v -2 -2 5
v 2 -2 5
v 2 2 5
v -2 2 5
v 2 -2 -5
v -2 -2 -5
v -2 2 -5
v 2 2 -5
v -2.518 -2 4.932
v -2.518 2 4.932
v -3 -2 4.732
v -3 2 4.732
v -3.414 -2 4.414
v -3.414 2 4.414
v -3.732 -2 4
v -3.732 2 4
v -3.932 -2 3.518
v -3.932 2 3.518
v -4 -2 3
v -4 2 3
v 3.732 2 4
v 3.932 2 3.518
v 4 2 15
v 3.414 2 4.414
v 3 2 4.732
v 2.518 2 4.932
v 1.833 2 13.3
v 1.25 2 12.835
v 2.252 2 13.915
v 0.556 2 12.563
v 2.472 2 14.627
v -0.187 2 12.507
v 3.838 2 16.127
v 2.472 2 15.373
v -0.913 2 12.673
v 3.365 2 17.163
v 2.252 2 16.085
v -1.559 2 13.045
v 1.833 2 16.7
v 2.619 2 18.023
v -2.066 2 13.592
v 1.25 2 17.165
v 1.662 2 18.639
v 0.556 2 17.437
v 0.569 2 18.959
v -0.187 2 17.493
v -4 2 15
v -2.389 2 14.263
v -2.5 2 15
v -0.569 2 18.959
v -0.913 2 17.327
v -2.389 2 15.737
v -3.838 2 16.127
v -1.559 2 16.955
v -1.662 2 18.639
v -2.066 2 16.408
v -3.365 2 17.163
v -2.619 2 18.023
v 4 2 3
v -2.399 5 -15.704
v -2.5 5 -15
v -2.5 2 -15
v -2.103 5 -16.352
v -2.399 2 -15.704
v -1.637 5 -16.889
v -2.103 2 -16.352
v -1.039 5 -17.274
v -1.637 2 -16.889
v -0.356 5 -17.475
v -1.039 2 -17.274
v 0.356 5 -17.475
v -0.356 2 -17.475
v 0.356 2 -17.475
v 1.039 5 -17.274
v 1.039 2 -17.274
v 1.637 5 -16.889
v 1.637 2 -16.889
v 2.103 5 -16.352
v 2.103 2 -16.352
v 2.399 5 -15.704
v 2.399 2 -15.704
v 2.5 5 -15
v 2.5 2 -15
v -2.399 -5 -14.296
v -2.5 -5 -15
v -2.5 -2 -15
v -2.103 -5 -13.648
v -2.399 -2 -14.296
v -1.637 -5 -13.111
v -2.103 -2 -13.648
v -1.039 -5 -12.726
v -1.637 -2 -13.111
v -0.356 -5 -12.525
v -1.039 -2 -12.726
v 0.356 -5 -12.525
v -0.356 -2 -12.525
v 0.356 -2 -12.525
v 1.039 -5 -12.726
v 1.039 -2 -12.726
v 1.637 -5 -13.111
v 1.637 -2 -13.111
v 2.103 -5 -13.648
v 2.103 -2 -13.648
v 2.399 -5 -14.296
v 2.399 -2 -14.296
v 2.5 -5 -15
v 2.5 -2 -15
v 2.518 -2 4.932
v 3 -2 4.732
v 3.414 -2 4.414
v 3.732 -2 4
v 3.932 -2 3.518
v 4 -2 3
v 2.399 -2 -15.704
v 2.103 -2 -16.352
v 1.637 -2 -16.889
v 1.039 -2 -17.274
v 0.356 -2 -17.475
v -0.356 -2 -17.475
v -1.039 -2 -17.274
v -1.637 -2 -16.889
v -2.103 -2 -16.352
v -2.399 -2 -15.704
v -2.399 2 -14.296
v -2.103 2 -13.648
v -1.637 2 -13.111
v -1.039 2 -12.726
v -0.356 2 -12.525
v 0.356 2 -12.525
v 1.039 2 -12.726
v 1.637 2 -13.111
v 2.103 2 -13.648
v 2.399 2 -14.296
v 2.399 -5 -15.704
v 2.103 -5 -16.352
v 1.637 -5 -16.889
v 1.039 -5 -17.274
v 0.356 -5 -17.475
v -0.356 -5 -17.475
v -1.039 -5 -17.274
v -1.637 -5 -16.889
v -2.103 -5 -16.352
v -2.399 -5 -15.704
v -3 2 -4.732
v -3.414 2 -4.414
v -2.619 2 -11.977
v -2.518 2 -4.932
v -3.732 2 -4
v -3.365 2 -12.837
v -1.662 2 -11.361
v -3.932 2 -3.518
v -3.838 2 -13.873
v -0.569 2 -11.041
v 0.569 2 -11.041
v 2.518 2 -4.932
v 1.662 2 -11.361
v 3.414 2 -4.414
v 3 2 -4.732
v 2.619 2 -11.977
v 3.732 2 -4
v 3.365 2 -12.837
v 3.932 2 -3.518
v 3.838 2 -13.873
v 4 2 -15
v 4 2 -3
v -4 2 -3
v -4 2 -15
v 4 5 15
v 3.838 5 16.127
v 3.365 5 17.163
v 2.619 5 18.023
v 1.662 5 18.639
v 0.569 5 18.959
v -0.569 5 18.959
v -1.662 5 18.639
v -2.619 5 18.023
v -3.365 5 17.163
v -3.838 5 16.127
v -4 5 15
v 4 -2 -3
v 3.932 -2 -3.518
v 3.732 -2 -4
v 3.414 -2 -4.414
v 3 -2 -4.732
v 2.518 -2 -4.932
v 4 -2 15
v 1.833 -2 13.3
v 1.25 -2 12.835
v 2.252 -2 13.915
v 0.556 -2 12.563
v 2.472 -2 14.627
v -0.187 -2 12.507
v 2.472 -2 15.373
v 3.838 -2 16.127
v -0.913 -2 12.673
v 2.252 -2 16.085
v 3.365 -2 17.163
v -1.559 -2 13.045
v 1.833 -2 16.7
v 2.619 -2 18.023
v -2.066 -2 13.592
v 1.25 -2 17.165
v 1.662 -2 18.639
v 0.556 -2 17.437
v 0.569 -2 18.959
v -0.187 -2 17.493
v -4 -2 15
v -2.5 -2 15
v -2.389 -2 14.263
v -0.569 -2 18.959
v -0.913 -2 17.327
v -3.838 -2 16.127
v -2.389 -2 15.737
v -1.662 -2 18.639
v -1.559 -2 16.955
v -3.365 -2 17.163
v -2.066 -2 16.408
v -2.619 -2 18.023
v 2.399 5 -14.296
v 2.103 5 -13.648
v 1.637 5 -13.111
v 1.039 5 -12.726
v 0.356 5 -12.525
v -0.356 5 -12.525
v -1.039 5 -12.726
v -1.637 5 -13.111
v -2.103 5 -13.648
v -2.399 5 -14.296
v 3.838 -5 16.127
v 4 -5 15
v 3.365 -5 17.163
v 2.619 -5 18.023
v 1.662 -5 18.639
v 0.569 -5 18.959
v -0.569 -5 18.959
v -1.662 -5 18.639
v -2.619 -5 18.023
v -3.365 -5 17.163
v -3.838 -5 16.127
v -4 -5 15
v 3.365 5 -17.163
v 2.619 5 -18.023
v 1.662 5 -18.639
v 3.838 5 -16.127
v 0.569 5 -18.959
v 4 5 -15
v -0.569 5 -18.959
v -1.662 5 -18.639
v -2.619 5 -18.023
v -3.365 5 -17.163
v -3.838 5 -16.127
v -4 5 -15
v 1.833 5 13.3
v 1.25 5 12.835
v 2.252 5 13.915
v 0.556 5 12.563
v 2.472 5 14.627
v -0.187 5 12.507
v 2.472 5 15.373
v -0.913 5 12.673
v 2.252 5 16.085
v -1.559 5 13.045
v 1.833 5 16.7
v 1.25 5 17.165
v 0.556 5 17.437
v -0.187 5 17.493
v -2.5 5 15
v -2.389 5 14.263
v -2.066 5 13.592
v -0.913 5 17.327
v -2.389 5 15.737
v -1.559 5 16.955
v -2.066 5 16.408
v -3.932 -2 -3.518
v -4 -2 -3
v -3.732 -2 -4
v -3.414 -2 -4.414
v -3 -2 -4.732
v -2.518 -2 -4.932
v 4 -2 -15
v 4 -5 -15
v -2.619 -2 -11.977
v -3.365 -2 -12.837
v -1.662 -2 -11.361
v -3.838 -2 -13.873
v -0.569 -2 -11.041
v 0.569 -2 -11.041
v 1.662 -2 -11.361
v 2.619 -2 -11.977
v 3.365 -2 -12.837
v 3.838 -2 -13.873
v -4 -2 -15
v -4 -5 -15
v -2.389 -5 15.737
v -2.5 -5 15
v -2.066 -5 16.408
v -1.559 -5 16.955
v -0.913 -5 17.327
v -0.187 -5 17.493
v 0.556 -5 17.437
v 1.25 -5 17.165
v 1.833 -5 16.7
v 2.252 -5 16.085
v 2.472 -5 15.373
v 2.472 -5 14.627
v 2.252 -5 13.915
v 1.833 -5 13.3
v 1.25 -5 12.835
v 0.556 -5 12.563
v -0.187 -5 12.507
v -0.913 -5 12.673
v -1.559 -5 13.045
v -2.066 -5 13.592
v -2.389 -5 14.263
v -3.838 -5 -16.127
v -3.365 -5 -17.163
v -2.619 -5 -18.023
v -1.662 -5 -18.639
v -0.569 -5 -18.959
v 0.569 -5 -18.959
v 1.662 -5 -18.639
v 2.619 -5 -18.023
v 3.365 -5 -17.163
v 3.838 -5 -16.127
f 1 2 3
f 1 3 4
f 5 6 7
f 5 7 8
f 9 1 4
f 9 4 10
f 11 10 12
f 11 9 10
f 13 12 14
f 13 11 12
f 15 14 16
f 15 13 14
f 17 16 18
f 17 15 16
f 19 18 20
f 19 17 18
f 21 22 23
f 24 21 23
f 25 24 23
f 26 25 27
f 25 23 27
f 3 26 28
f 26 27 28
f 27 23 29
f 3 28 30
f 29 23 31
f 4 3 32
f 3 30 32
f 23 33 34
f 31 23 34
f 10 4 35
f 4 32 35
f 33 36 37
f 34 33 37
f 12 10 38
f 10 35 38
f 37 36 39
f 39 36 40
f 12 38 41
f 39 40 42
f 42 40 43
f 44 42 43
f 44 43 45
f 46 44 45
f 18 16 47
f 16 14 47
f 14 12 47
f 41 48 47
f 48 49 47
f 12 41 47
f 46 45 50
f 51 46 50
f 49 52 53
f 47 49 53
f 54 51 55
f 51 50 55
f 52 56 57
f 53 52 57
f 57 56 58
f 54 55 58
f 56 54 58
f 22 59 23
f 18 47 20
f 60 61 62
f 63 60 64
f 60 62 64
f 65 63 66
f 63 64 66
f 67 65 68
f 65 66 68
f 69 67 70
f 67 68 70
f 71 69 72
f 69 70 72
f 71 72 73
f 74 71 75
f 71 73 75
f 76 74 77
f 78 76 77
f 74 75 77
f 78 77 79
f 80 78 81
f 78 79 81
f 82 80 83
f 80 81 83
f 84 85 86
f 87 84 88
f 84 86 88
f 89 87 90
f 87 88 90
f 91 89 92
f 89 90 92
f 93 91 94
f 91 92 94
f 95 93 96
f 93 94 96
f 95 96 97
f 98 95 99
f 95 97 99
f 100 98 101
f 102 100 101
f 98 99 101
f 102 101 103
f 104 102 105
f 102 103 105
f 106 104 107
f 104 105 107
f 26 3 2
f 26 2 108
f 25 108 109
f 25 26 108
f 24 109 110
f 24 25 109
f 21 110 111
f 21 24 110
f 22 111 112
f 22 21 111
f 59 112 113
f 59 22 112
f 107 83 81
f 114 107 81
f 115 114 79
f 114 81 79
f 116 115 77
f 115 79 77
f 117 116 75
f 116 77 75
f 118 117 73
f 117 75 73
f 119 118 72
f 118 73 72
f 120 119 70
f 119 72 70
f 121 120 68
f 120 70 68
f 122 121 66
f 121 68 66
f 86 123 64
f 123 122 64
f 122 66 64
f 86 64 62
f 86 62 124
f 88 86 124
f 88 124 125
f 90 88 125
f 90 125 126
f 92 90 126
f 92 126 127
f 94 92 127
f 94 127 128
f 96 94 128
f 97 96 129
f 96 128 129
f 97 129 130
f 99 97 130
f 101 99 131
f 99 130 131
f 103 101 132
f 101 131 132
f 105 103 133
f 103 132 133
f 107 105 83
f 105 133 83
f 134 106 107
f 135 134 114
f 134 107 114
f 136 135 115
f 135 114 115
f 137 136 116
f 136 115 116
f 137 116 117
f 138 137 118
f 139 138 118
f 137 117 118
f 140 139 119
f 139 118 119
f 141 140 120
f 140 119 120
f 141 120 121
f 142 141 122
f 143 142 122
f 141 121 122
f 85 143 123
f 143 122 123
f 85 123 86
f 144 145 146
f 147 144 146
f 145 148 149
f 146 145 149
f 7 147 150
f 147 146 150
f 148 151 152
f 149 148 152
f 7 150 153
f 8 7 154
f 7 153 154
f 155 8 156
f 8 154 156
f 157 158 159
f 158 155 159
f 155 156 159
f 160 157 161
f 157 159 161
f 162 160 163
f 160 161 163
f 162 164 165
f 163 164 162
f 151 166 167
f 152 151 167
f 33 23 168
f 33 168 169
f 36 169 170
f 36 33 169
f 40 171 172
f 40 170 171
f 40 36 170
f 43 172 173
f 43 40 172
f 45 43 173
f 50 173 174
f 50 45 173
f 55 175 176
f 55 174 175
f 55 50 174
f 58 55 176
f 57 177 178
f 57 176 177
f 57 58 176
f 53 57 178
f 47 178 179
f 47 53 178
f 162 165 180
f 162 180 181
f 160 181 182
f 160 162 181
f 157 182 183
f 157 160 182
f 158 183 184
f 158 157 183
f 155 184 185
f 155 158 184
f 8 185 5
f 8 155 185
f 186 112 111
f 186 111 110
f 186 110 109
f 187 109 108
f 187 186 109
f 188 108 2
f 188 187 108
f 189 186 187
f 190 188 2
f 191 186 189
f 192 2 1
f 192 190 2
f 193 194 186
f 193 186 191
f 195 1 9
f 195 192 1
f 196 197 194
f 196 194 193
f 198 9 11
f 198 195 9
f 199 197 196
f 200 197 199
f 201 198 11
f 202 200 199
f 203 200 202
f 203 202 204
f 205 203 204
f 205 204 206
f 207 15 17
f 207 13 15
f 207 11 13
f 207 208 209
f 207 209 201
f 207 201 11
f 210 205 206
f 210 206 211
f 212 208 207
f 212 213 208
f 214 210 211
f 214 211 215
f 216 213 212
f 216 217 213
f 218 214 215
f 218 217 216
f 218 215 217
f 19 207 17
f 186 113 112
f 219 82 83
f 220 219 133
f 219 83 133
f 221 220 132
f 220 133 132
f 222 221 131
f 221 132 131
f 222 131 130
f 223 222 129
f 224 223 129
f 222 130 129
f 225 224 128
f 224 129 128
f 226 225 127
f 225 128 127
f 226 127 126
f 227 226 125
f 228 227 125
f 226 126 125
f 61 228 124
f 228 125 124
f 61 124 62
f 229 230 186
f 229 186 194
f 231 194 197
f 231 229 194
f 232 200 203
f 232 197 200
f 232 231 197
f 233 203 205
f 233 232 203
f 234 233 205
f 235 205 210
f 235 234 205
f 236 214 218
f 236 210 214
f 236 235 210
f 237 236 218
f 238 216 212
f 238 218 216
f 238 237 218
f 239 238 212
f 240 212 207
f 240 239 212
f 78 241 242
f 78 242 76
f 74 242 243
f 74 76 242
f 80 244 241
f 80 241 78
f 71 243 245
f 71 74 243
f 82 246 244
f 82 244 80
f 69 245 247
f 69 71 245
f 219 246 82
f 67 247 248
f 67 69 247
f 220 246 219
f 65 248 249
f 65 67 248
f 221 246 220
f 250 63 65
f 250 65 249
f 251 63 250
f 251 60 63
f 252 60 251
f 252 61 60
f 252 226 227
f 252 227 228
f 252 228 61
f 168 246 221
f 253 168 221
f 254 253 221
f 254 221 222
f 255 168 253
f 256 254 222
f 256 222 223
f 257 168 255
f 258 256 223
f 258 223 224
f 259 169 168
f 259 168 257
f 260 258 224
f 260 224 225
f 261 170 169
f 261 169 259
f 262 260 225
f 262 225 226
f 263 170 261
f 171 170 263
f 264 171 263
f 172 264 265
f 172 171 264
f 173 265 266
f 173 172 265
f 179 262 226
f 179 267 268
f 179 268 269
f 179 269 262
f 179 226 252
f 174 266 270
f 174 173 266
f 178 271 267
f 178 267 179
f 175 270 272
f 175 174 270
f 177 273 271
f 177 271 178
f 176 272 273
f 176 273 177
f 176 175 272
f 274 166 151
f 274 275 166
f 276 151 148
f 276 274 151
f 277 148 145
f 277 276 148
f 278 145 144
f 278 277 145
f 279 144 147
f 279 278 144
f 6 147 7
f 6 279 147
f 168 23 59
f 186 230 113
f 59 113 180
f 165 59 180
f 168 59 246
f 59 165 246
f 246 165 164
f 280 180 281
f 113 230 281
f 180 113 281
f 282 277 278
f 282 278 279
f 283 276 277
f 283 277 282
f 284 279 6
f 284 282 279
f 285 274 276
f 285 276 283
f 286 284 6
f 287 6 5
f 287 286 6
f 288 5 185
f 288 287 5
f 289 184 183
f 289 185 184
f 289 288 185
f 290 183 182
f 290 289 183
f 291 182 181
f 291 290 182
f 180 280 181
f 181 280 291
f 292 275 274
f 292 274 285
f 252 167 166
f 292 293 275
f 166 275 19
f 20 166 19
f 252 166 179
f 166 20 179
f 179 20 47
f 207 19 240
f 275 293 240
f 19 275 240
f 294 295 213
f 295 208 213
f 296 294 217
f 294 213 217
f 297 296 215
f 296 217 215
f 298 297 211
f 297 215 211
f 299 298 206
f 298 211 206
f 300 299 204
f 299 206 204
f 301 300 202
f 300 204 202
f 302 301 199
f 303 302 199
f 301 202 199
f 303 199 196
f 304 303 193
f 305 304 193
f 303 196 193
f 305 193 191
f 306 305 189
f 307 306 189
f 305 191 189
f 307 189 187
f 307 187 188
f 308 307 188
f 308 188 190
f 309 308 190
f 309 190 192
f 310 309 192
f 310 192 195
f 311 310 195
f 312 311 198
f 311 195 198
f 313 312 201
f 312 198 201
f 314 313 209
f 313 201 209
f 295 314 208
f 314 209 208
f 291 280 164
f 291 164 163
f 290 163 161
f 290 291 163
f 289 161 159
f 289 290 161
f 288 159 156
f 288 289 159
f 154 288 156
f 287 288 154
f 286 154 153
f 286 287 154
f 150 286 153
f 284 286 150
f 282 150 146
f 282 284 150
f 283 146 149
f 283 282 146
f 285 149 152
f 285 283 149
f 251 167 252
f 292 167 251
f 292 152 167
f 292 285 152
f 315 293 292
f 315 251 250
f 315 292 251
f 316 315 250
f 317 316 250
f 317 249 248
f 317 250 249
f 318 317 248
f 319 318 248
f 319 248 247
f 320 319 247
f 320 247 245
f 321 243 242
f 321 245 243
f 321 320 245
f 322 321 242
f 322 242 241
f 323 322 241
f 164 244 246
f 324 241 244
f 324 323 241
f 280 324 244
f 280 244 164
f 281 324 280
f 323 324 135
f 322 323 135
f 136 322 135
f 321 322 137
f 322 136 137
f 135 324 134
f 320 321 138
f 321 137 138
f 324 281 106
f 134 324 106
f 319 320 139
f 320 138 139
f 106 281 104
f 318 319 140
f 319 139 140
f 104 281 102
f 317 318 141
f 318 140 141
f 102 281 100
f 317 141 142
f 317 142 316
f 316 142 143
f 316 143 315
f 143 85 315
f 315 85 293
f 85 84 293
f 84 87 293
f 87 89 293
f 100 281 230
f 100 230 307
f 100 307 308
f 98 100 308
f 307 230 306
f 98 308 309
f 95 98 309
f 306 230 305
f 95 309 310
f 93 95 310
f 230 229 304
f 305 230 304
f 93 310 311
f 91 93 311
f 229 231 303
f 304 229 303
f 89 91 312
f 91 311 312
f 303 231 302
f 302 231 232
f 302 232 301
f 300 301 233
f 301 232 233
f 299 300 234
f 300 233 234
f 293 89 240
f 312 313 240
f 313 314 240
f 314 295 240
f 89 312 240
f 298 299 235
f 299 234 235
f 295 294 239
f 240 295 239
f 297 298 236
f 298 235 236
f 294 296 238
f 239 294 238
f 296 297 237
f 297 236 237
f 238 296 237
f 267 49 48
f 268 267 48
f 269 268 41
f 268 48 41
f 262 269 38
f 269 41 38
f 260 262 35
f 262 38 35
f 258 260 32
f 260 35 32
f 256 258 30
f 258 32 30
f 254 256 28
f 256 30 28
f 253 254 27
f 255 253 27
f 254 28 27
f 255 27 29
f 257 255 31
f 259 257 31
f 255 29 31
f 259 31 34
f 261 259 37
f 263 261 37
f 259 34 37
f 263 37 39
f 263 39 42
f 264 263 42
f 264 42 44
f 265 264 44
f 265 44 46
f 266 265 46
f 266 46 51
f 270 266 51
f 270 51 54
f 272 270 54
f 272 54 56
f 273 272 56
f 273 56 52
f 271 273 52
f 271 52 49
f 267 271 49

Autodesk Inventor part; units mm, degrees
ref_plane "YZ Plane" through (0, 0, 0) normal (1, 0, 0) x (0, 1, 0)
ref_plane "XZ Plane" through (0, 0, 0) normal (0, 1, 0) x (-1, 0, 0)
ref_plane "XY Plane" through (0, 0, 0) normal (0, 0, 1) x (1, 0, 0)
sketch "Szkic1" plane through (0, 0, 0) normal (0, 1, 0) x (-1, 0, 0)
  line L0 (0, 15) -> (0, -15) construction
  line L1 (-4, 15) -> (-4, -15)
  line L2 (4, -15) -> (4, 15)
  arc A0 (4, 15) -> (-4, 15) centre (0, 15) ccw
  arc A1 (-4, -15) -> (4, -15) centre (0, -15) ccw
  circle A2 centre (0, -15) radius 2.5
  circle A3 centre (0, 15) radius 2.5
  line L3 (0, 15) -> (0, 5)
  line L4 (0, 5) -> (4, 5)
  line L5 (0, 5) -> (-4, 5)
  point P0 (0, 0)
  dimension "d0" = 15
  dimension "d1" = 8
  dimension "d2" = 5
  dimension "d3" = 5
  dimension "d6" = 10
extrude "Wyciągnięcie proste1" add sketch "Szkic1" along normal mid plane 10 contours A0 L2 L4 L5 L1 | L5 L4 L2 A1 L1 | A2 | A3
extrude "Wyciągnięcie proste2" cut sketch "Szkic1" along normal mid plane 4 contours A0 L2 L4 L5 L1
extrude "Wyciągnięcie proste3" cut sketch "Szkic1" along normal mid plane 14.5 contours A3
mirror "Odbij1" about plane through (0, 0, 0) normal (0, 0, 1) of "Wyciągnięcie proste2", "Wyciągnięcie proste3"
fillet "Zaokrąglenie1" radius 2 4 edges at (-4, 0, 5) (-4, 0, -5) (4, 0, -5) (4, 0, 5)
sketch "Szkic2" plane through (0, 5, 0) normal (0, 1, 0) x (1, 0, 0)
  circle A0 centre (0, 15) radius 2.5 projected
  circle A1 centre (0, 15) radius 4
  circle A2 centre (0, 15) radius 2.5
  point P0 (0, 0)
extrude "Wyciągnięcie proste4" add sketch "Szkic2" against normal up to surface (10 mm away)
properties part number "connector"
